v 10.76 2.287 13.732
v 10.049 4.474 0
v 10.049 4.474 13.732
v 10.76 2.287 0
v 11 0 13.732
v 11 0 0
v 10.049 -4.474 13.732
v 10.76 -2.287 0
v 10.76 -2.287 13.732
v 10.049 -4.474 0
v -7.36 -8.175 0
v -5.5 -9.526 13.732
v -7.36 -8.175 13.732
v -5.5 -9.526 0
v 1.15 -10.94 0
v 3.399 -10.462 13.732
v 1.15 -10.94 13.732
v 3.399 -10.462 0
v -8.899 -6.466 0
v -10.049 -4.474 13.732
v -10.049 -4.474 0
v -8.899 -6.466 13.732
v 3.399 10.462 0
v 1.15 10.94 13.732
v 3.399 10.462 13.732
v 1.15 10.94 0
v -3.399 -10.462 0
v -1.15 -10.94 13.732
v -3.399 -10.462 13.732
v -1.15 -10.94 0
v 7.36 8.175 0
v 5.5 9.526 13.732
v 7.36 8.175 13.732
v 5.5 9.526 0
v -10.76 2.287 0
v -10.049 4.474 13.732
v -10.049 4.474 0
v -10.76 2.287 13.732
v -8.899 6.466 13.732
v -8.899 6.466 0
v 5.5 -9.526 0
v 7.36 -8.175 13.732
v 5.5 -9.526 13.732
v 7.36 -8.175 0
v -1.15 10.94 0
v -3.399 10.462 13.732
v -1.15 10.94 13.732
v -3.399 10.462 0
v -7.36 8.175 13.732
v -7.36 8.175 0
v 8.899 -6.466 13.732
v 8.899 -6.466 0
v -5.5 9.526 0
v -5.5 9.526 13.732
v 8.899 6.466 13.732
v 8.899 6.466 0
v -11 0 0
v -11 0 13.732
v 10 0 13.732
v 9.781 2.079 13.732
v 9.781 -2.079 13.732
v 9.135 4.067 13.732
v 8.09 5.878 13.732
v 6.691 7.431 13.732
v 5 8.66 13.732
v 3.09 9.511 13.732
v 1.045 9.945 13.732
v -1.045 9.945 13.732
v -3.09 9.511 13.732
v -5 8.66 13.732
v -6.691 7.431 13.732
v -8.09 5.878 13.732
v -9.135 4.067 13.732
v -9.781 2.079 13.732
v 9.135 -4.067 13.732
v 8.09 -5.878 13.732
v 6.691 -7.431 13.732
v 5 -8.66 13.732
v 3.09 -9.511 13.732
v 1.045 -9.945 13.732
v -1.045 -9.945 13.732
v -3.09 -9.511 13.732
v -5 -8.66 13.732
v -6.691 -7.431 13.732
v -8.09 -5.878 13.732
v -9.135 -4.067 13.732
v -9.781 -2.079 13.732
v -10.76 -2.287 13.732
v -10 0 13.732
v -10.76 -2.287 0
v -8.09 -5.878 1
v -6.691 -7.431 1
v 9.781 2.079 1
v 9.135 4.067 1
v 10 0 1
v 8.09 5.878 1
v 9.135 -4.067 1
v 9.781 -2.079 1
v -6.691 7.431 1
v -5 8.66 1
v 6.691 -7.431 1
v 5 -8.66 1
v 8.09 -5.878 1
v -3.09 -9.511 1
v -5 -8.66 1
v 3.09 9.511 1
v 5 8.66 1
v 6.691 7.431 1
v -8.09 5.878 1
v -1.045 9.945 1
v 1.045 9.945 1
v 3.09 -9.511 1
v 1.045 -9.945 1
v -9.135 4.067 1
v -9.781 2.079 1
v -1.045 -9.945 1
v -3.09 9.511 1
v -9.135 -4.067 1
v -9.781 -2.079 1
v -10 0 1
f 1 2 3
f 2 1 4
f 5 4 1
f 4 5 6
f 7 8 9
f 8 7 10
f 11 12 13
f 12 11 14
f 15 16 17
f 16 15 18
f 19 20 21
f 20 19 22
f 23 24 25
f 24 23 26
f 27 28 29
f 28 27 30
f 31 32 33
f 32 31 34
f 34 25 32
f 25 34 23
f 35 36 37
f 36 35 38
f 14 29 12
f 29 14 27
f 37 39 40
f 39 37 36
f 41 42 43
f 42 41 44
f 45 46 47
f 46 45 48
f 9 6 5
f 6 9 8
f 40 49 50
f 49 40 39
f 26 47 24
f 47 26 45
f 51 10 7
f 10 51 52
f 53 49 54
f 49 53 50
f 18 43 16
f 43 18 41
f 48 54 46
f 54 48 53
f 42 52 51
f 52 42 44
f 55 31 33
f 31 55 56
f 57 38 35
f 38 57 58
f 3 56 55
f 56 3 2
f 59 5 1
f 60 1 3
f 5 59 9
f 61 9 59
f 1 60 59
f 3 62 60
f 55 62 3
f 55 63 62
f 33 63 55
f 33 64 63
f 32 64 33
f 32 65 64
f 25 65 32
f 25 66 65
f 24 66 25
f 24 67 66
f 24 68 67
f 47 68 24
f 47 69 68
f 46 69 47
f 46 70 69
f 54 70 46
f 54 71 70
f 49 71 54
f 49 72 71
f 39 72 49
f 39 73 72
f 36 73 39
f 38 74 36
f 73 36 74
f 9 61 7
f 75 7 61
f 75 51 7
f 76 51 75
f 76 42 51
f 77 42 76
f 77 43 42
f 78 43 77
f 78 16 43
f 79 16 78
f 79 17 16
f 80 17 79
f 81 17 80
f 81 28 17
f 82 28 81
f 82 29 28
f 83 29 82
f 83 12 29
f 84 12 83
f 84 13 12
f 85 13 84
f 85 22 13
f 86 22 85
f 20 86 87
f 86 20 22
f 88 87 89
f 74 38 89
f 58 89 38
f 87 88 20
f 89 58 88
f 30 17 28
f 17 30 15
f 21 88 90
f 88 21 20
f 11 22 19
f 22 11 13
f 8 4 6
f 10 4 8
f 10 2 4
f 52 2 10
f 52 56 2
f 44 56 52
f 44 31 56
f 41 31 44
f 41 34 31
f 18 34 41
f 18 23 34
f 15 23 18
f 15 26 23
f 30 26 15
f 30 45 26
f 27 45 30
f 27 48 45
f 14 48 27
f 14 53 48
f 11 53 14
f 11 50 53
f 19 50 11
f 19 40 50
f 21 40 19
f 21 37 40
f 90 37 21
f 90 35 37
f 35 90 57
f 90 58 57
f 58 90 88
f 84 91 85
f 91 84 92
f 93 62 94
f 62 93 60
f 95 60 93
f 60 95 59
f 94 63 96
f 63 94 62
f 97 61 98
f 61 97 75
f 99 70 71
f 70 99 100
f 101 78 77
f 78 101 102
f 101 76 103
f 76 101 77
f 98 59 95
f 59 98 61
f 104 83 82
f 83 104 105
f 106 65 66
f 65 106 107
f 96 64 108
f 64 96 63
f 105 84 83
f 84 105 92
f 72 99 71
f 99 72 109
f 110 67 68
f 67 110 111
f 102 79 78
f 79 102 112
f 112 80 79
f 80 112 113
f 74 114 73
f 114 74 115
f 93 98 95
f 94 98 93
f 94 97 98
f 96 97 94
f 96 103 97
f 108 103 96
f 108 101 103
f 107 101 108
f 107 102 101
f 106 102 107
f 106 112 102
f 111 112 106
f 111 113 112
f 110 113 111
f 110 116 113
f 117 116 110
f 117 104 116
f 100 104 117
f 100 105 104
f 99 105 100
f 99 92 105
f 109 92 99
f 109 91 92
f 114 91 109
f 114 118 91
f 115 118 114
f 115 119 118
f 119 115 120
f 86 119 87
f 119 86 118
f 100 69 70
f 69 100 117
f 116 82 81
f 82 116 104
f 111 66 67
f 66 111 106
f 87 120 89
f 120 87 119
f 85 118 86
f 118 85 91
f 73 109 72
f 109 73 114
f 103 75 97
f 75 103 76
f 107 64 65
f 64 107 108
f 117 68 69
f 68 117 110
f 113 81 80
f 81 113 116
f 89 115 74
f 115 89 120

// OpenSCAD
volume = 4;
radius = 10;
height = (volume*1000)/(PI*radius*radius);

wall_thickness = 1;
difference(){
	cylinder(r=radius+wall_thickness, h=height+wall_thickness);
	translate([0,0,wall_thickness])cylinder(r=radius, h=height);
}
